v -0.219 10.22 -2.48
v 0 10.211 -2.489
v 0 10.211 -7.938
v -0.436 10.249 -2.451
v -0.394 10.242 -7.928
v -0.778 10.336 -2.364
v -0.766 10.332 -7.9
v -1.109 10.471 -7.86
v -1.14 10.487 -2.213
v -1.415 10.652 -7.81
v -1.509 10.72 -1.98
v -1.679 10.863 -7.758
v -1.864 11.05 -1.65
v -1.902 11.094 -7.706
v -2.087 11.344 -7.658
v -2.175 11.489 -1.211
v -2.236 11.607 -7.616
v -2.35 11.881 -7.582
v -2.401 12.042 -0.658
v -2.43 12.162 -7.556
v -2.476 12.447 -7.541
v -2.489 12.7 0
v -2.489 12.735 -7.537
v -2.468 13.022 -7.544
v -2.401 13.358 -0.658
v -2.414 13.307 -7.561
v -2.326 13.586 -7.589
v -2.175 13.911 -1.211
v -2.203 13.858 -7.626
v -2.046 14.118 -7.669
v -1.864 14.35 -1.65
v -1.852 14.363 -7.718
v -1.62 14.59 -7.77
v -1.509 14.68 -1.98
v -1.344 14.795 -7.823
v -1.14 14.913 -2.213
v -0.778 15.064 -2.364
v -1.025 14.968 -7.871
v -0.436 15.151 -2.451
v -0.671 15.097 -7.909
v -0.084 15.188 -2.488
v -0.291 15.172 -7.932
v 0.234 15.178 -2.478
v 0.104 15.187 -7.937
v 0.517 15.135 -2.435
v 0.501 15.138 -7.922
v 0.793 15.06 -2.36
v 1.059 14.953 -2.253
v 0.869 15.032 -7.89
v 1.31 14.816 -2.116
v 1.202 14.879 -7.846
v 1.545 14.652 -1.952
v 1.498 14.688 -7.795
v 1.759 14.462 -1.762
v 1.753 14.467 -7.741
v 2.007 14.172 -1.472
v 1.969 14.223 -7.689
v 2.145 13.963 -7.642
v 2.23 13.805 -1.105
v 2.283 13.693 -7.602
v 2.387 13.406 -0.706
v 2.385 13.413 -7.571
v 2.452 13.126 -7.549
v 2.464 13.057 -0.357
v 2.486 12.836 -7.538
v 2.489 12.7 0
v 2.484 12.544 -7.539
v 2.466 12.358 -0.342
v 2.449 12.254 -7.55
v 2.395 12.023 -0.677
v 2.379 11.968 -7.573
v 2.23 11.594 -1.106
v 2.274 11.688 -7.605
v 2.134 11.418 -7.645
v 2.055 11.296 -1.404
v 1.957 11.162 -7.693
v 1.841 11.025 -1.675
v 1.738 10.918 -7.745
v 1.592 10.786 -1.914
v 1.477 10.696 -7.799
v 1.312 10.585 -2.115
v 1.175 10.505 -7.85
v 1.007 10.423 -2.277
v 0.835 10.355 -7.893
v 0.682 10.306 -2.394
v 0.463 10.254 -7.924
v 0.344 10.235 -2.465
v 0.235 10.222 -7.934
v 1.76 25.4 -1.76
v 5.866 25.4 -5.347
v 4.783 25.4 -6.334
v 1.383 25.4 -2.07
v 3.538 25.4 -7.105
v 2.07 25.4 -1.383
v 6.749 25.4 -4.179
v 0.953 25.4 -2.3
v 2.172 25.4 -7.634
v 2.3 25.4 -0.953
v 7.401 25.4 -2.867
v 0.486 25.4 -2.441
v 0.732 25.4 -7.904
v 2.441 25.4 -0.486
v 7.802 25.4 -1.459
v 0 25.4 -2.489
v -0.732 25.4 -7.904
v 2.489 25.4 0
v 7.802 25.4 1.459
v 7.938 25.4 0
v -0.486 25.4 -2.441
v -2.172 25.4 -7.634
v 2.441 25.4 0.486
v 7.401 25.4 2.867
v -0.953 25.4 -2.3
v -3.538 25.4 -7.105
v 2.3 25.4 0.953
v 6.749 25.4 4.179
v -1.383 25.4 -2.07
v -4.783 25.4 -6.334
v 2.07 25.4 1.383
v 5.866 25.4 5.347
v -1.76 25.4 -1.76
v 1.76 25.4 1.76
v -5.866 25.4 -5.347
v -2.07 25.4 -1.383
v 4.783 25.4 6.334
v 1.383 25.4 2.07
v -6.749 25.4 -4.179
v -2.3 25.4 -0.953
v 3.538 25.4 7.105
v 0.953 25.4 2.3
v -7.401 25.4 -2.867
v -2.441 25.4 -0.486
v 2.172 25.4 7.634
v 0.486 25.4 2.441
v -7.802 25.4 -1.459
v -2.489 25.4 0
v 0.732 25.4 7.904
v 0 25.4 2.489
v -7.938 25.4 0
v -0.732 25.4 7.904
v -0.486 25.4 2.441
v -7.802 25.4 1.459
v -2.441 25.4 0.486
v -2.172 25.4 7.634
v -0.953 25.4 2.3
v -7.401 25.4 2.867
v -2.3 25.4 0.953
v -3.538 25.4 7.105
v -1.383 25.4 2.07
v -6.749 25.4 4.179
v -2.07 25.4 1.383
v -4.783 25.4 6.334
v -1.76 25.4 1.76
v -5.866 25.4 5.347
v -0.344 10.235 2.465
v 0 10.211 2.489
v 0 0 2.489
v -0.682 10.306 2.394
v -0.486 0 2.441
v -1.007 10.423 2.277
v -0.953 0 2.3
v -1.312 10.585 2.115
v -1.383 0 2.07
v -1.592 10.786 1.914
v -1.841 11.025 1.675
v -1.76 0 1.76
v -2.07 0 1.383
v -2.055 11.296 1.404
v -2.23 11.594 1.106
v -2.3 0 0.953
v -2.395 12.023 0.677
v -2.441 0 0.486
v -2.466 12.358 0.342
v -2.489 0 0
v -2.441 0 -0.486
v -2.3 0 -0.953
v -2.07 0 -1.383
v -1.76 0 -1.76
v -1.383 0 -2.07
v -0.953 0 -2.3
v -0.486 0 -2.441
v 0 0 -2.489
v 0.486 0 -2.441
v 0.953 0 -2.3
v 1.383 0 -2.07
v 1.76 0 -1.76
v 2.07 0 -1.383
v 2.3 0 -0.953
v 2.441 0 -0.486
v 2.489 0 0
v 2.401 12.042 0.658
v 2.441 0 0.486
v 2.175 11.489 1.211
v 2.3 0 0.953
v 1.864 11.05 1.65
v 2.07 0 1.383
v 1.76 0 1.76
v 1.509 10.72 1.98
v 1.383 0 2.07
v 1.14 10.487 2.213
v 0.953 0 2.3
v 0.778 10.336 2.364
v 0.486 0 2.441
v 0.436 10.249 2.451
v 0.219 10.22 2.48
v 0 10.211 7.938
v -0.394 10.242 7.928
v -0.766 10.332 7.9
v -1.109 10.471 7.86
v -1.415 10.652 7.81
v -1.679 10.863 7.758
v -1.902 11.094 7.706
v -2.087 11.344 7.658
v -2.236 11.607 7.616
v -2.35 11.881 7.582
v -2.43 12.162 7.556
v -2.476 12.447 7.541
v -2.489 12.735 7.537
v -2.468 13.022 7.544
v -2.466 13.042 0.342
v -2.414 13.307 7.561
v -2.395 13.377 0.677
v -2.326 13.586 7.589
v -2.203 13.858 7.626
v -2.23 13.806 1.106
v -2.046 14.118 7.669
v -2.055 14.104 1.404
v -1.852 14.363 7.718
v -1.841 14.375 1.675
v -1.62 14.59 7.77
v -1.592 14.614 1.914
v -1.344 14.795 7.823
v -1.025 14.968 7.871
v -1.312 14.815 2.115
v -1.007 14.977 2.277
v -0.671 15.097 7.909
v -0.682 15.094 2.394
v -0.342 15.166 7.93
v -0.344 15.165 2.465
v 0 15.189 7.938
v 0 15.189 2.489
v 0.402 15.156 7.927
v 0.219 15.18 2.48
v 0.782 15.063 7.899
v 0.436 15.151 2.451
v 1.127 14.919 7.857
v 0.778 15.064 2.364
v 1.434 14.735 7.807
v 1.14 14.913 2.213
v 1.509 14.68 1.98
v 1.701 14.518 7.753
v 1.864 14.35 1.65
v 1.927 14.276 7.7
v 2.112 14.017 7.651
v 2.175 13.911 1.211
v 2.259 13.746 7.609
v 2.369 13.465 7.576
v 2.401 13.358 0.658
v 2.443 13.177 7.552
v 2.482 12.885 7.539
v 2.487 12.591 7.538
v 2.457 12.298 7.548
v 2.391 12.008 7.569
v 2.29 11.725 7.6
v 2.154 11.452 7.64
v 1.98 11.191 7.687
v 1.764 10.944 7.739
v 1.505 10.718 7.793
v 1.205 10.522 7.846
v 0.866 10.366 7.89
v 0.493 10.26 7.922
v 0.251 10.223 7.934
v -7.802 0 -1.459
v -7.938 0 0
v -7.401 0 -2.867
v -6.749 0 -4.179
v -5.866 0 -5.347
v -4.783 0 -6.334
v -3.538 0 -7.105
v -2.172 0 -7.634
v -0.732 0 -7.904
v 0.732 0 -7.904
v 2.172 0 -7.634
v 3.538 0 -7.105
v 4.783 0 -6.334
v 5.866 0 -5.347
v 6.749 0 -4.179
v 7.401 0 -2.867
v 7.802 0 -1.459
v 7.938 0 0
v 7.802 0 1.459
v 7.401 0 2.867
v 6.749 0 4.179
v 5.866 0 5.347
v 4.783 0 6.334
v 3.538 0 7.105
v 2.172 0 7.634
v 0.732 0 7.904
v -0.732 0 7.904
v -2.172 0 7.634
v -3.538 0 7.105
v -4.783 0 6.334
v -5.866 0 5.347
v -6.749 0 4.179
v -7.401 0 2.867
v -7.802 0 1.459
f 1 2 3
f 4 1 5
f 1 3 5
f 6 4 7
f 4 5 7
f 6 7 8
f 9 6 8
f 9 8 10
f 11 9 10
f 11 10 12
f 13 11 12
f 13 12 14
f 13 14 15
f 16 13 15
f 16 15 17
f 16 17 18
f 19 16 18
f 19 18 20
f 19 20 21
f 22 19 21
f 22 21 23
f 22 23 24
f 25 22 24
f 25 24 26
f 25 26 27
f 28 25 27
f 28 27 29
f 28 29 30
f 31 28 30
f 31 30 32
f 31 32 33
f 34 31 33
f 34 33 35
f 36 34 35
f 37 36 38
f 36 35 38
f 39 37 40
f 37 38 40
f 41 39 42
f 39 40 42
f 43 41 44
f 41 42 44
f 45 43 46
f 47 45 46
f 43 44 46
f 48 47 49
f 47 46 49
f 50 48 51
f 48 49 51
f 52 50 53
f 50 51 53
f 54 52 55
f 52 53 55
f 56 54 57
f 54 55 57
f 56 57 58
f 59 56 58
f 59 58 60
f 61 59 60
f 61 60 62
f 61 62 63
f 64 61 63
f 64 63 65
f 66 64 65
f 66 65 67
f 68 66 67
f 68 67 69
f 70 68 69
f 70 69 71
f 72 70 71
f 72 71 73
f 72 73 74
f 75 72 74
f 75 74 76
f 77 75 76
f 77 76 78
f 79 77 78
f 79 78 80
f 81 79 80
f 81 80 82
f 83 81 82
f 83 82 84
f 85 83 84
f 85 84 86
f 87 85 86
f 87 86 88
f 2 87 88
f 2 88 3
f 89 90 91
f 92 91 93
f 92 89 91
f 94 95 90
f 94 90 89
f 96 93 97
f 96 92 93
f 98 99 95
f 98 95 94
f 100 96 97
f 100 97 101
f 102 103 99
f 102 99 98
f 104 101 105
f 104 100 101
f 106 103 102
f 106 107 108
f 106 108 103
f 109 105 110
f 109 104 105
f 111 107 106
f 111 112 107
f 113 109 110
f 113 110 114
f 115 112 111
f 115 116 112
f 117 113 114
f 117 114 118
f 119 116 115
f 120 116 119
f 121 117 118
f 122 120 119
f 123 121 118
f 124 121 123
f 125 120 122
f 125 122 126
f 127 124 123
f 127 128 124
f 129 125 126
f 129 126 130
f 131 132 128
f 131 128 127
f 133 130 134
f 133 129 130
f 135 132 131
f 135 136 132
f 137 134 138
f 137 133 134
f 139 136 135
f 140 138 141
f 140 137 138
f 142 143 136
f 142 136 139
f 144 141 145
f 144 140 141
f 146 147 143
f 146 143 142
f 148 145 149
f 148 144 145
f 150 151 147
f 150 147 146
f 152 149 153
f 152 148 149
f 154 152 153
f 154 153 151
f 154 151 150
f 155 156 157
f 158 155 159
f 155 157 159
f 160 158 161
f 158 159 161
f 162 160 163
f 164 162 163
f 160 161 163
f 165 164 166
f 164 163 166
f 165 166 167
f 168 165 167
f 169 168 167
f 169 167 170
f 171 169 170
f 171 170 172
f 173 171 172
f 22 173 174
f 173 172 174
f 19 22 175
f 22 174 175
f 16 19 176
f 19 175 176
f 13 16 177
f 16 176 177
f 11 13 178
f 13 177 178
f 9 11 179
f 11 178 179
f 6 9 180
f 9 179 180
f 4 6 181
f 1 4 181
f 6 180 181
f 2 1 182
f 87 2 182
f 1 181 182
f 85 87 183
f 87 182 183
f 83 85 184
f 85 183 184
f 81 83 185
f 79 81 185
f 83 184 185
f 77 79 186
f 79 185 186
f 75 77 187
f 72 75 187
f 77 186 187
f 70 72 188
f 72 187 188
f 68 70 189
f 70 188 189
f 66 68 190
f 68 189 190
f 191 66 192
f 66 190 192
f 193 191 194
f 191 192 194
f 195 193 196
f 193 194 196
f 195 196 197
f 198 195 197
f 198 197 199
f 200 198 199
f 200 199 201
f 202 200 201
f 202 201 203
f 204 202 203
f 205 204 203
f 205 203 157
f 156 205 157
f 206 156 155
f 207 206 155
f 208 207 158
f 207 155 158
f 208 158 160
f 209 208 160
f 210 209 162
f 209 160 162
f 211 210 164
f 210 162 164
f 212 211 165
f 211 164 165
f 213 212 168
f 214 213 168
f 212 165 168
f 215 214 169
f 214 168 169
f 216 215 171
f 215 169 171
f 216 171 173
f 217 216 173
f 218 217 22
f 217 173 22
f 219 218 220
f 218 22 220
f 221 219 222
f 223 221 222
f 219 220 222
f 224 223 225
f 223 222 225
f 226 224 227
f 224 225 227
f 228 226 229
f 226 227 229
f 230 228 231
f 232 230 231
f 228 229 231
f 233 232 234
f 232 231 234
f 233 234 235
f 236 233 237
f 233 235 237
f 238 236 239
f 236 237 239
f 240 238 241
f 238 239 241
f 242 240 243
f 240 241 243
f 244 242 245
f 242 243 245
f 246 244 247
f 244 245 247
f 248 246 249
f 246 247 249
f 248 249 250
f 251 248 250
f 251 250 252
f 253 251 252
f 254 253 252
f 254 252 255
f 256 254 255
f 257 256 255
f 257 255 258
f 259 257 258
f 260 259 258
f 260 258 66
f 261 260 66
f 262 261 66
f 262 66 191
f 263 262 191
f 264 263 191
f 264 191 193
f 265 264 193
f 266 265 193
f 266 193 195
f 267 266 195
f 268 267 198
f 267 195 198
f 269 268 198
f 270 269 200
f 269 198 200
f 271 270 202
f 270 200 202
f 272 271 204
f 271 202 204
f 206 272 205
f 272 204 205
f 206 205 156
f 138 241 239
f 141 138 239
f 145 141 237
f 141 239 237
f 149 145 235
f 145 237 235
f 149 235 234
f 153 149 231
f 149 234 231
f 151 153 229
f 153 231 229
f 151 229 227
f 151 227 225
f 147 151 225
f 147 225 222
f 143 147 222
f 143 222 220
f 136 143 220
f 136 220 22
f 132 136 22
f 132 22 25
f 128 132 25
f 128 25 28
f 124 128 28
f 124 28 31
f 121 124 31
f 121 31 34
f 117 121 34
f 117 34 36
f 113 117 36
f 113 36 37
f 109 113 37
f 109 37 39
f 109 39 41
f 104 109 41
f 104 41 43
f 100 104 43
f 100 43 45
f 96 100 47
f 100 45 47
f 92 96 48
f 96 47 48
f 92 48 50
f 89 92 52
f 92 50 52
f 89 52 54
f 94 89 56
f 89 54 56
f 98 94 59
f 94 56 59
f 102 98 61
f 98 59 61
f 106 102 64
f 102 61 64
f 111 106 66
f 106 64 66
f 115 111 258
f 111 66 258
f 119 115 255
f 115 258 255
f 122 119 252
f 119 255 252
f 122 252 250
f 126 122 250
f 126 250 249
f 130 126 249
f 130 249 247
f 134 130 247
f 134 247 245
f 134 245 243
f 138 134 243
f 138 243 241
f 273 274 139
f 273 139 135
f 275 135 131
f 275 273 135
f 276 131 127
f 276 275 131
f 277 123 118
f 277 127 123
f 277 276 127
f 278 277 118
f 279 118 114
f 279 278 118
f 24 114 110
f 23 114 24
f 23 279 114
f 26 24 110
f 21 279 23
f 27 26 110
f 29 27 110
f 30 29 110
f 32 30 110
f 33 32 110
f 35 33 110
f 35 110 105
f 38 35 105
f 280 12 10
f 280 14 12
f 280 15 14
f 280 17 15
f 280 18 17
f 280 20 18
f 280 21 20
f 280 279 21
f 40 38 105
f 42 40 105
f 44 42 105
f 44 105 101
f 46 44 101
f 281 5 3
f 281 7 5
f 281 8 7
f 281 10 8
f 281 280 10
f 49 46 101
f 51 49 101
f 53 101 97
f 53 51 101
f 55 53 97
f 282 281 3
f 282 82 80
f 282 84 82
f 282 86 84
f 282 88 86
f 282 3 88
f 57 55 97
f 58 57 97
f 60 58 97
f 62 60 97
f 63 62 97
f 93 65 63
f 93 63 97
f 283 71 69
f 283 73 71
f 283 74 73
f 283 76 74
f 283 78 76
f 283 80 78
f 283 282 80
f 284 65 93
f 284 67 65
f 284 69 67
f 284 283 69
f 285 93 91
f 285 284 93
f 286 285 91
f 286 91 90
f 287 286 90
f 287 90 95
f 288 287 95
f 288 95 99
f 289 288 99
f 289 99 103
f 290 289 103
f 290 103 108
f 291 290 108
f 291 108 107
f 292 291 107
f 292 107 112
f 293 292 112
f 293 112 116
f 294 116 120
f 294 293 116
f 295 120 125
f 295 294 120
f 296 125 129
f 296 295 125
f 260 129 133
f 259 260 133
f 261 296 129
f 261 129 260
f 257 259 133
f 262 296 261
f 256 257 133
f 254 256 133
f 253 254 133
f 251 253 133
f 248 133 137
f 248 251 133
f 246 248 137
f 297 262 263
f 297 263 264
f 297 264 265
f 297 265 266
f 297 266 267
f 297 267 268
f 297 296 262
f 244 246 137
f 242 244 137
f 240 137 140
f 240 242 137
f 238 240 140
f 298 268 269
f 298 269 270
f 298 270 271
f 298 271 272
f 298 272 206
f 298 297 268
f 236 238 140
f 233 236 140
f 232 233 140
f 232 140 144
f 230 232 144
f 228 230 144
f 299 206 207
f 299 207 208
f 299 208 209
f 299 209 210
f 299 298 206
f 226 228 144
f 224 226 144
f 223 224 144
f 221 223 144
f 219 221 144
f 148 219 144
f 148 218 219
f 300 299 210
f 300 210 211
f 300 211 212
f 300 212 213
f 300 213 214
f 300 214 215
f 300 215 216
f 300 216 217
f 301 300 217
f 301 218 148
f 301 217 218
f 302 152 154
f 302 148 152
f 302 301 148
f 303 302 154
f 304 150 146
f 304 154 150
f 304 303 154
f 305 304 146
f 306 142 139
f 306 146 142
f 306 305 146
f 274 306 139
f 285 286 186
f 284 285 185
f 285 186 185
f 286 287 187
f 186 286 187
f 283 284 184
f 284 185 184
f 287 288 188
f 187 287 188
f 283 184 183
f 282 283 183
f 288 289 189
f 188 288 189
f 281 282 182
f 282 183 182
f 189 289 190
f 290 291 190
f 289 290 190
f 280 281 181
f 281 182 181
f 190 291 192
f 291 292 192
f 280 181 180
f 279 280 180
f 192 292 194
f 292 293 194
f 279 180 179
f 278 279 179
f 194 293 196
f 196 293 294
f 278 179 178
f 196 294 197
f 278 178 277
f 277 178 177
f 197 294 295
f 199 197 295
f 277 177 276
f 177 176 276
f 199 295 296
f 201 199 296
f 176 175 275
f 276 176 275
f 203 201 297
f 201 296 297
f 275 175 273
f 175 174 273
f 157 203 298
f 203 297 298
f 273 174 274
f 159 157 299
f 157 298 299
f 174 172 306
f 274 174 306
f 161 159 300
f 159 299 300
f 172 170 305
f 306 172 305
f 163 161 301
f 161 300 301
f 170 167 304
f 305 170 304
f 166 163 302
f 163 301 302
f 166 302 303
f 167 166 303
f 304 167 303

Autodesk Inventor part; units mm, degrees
ref_plane "YZ Plane" through (0, 0, 0) normal (1, 0, 0) x (0, 1, 0)
ref_plane "XZ Plane" through (0, 0, 0) normal (0, 1, 0) x (-1, 0, 0)
sketch "Sketch1" plane through (0, 0, 0) normal (0, 1, 0) x (-1, 0, 0)
  circle A0 centre (0, 0) radius 7.9375
  dimension "d0" = 15.875
extrude "Extrusion1" add sketch "Sketch1" along normal blind 25.4
sketch "Sketch2" plane through (0, 25.4, 0) normal (0, 1, 0) x (1, 0, 0)
  point P0 (0, 0)
  point P1 (0, 0)
hole "Hole1" at (0, 25.4, 0) direction (0, -1, 0) diameter 4.9784 end through all thread size "1/4-20 UNC" class "2B" standard "ANSI Unified Screw Threads"
ref_plane "Work Plane1" through (0, 0, 7.9375) normal (0, 0, 1) x (1, 0, 0)
sketch "Sketch4" plane through (0, 0, 7.9375) normal (0, 0, 1) x (1, 0, 0)
  point P0 (0, 0)
  point P1 (0, 12.7)
  dimension "d11" = 12.7
hole "Hole2" at (0, 12.7, 7.9375) direction (0, 0, -1) diameter 4.9784 end through all thread size "1/4-20 UNC" class "2B" standard "ANSI Unified Screw Threads"
equation "\"d0\" = SlidingTensionerRoundDiameter"
equation "\"d1\" = ShapeWidth"
equation "\"d4\" = ShapeWidth"
equation "\"d11\" = 0.5 * ShapeWidth"
equation "\"d13\" = SlidingTensionerRoundDiameter"
equation "\"DrivebaseLength\" = 762"
equation "\"DrivebaseWidth\" = 660.4"
equation "\"ShapeHeight\" = 76.2"
equation "\"ShapeWidth\" = 25.4"
equation "\"ShapeThickness\" = 3.175"
equation "\"WheelDiameter\" = 152.4"
equation "\"WheelRadius\" = 76.2"
equation "\"WheelClearancetoFrame\" = 25.4"
equation "\"SlotLength\" = 88.9"
equation "\"SlotWidth\" = 15.9512"
equation "\"CenterAxleDrop\" = 3.175"
equation "\"CenterAxleXPosition\" = 381"
equation "\"CenterAxleYPosition\" = 25.4"
equation "\"Crossmember1Position\" = 203.2"
equation "\"Crossmember2Position\" = 203.2"
equation "\"CenterlineDrivebaseLength\" = 736.6"
equation "\"CenterlineDrivebaseWidth\" = 635"
equation "\"WheelDistanceFromEdge\" = 101.6"
equation "\"TensionAssemblyJointTravelLengthStart\" = -15.875"
equation "\"SlidingTensionerRoundClearance\" = 0.0762"
equation "\"CenterPointToTensionerRound\" = 28.575"
equation "\"SlidingTensionerRoundDiameter\" = 15.875"
equation "\"TensionAssemblyJointTravelLengthEnd\" = 15.875"
properties part number "200289" material "Steel, Carbon"
